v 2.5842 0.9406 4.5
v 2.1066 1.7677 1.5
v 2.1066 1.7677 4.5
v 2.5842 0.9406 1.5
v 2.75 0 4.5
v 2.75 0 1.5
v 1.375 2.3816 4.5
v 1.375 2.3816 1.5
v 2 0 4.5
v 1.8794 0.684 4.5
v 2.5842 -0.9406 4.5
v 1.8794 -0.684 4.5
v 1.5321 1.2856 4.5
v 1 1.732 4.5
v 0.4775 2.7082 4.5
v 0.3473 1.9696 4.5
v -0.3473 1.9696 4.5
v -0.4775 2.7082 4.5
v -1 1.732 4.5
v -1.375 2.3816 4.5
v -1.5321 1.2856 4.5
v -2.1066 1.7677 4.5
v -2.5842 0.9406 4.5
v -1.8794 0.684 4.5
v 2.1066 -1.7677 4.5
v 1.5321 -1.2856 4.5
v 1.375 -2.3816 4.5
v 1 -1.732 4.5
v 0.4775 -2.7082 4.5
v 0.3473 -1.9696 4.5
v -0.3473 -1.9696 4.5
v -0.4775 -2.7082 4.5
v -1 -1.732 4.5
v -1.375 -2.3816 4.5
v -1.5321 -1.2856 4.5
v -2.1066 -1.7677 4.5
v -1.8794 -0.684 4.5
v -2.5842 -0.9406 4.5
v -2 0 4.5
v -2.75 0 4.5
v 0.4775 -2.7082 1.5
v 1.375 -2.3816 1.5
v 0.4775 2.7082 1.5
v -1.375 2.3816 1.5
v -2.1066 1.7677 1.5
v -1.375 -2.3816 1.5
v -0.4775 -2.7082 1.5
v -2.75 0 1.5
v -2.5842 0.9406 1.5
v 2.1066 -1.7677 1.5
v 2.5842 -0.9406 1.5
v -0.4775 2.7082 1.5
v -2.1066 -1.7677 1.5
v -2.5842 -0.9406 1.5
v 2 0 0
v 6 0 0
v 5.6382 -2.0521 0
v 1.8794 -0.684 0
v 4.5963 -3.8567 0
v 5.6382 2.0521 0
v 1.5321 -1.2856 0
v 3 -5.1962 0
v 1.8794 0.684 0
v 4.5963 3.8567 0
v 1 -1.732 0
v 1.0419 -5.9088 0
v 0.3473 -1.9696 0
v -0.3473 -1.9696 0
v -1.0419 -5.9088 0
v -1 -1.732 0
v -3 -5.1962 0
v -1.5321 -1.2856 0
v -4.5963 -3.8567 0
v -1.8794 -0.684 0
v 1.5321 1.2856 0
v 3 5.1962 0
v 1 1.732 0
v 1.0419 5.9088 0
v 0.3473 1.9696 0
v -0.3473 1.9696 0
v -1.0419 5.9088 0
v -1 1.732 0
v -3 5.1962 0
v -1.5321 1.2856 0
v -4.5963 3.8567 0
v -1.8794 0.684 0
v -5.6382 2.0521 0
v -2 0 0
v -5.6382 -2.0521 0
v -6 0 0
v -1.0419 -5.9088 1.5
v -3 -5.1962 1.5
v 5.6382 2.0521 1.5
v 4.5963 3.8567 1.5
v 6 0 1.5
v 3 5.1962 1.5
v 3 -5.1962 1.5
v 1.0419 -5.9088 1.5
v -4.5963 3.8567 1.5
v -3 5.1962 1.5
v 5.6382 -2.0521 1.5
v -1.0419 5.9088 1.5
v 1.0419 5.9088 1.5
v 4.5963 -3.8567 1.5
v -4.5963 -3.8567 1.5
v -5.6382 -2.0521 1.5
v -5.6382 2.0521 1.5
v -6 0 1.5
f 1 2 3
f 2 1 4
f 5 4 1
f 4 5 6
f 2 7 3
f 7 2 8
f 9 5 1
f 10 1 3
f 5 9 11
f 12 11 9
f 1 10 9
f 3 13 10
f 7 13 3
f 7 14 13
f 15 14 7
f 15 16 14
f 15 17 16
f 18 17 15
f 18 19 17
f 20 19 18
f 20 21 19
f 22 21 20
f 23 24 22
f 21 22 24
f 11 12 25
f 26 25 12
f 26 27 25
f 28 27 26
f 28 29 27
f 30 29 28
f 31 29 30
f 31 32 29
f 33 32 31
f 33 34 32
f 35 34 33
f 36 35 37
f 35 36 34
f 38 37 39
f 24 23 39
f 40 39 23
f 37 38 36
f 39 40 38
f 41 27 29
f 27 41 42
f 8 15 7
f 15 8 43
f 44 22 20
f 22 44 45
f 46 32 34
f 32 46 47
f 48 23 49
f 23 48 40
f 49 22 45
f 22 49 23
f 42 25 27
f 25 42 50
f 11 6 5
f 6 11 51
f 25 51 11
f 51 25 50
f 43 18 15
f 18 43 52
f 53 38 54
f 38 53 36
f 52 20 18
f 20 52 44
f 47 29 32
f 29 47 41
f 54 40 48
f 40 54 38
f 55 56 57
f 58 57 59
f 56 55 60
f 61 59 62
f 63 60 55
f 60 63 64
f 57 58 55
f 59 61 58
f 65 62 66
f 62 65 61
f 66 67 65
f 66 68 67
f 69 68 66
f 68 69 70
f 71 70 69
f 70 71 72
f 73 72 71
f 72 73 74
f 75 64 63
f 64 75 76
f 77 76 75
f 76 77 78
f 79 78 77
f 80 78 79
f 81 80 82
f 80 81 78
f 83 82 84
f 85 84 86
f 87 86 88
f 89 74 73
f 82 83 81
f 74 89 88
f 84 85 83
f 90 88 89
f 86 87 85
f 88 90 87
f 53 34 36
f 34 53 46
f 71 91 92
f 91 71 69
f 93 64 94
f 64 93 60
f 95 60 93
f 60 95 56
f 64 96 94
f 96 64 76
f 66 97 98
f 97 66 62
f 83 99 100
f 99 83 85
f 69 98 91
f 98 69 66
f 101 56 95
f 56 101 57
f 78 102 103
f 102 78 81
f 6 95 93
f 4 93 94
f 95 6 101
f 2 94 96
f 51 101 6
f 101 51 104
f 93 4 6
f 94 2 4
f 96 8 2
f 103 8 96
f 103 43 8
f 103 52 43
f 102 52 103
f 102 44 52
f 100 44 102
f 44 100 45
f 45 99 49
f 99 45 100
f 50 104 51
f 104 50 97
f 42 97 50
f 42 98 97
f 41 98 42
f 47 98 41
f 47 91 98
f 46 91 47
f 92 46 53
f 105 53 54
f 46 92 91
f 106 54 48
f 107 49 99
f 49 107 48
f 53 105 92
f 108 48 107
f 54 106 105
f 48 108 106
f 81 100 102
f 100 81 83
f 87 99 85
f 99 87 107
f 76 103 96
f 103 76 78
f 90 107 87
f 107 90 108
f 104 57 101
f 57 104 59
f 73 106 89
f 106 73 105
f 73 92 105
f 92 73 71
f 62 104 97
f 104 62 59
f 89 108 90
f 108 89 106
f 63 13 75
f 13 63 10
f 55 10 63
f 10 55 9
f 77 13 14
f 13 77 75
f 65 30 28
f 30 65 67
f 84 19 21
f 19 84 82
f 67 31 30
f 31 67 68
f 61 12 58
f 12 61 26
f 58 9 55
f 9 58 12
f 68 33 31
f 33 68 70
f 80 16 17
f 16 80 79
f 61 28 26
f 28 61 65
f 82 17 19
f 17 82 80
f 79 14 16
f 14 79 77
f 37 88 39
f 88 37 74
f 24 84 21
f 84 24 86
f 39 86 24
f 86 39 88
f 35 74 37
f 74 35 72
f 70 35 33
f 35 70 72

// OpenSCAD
// Little nub that centers bed spring around its mounting screw.  Need two nubs per spring.

difference() {
    base();
    holes();
}

module base() {
    cylinder(d=5.5, h=1.5+3.0, $fn=18, center=false);
    cylinder(d=12, h=1.5, $fn=18, center=false);
}

module holes() {
    cylinder(d=4.0, h=10, $fn=18, center=true);
}
